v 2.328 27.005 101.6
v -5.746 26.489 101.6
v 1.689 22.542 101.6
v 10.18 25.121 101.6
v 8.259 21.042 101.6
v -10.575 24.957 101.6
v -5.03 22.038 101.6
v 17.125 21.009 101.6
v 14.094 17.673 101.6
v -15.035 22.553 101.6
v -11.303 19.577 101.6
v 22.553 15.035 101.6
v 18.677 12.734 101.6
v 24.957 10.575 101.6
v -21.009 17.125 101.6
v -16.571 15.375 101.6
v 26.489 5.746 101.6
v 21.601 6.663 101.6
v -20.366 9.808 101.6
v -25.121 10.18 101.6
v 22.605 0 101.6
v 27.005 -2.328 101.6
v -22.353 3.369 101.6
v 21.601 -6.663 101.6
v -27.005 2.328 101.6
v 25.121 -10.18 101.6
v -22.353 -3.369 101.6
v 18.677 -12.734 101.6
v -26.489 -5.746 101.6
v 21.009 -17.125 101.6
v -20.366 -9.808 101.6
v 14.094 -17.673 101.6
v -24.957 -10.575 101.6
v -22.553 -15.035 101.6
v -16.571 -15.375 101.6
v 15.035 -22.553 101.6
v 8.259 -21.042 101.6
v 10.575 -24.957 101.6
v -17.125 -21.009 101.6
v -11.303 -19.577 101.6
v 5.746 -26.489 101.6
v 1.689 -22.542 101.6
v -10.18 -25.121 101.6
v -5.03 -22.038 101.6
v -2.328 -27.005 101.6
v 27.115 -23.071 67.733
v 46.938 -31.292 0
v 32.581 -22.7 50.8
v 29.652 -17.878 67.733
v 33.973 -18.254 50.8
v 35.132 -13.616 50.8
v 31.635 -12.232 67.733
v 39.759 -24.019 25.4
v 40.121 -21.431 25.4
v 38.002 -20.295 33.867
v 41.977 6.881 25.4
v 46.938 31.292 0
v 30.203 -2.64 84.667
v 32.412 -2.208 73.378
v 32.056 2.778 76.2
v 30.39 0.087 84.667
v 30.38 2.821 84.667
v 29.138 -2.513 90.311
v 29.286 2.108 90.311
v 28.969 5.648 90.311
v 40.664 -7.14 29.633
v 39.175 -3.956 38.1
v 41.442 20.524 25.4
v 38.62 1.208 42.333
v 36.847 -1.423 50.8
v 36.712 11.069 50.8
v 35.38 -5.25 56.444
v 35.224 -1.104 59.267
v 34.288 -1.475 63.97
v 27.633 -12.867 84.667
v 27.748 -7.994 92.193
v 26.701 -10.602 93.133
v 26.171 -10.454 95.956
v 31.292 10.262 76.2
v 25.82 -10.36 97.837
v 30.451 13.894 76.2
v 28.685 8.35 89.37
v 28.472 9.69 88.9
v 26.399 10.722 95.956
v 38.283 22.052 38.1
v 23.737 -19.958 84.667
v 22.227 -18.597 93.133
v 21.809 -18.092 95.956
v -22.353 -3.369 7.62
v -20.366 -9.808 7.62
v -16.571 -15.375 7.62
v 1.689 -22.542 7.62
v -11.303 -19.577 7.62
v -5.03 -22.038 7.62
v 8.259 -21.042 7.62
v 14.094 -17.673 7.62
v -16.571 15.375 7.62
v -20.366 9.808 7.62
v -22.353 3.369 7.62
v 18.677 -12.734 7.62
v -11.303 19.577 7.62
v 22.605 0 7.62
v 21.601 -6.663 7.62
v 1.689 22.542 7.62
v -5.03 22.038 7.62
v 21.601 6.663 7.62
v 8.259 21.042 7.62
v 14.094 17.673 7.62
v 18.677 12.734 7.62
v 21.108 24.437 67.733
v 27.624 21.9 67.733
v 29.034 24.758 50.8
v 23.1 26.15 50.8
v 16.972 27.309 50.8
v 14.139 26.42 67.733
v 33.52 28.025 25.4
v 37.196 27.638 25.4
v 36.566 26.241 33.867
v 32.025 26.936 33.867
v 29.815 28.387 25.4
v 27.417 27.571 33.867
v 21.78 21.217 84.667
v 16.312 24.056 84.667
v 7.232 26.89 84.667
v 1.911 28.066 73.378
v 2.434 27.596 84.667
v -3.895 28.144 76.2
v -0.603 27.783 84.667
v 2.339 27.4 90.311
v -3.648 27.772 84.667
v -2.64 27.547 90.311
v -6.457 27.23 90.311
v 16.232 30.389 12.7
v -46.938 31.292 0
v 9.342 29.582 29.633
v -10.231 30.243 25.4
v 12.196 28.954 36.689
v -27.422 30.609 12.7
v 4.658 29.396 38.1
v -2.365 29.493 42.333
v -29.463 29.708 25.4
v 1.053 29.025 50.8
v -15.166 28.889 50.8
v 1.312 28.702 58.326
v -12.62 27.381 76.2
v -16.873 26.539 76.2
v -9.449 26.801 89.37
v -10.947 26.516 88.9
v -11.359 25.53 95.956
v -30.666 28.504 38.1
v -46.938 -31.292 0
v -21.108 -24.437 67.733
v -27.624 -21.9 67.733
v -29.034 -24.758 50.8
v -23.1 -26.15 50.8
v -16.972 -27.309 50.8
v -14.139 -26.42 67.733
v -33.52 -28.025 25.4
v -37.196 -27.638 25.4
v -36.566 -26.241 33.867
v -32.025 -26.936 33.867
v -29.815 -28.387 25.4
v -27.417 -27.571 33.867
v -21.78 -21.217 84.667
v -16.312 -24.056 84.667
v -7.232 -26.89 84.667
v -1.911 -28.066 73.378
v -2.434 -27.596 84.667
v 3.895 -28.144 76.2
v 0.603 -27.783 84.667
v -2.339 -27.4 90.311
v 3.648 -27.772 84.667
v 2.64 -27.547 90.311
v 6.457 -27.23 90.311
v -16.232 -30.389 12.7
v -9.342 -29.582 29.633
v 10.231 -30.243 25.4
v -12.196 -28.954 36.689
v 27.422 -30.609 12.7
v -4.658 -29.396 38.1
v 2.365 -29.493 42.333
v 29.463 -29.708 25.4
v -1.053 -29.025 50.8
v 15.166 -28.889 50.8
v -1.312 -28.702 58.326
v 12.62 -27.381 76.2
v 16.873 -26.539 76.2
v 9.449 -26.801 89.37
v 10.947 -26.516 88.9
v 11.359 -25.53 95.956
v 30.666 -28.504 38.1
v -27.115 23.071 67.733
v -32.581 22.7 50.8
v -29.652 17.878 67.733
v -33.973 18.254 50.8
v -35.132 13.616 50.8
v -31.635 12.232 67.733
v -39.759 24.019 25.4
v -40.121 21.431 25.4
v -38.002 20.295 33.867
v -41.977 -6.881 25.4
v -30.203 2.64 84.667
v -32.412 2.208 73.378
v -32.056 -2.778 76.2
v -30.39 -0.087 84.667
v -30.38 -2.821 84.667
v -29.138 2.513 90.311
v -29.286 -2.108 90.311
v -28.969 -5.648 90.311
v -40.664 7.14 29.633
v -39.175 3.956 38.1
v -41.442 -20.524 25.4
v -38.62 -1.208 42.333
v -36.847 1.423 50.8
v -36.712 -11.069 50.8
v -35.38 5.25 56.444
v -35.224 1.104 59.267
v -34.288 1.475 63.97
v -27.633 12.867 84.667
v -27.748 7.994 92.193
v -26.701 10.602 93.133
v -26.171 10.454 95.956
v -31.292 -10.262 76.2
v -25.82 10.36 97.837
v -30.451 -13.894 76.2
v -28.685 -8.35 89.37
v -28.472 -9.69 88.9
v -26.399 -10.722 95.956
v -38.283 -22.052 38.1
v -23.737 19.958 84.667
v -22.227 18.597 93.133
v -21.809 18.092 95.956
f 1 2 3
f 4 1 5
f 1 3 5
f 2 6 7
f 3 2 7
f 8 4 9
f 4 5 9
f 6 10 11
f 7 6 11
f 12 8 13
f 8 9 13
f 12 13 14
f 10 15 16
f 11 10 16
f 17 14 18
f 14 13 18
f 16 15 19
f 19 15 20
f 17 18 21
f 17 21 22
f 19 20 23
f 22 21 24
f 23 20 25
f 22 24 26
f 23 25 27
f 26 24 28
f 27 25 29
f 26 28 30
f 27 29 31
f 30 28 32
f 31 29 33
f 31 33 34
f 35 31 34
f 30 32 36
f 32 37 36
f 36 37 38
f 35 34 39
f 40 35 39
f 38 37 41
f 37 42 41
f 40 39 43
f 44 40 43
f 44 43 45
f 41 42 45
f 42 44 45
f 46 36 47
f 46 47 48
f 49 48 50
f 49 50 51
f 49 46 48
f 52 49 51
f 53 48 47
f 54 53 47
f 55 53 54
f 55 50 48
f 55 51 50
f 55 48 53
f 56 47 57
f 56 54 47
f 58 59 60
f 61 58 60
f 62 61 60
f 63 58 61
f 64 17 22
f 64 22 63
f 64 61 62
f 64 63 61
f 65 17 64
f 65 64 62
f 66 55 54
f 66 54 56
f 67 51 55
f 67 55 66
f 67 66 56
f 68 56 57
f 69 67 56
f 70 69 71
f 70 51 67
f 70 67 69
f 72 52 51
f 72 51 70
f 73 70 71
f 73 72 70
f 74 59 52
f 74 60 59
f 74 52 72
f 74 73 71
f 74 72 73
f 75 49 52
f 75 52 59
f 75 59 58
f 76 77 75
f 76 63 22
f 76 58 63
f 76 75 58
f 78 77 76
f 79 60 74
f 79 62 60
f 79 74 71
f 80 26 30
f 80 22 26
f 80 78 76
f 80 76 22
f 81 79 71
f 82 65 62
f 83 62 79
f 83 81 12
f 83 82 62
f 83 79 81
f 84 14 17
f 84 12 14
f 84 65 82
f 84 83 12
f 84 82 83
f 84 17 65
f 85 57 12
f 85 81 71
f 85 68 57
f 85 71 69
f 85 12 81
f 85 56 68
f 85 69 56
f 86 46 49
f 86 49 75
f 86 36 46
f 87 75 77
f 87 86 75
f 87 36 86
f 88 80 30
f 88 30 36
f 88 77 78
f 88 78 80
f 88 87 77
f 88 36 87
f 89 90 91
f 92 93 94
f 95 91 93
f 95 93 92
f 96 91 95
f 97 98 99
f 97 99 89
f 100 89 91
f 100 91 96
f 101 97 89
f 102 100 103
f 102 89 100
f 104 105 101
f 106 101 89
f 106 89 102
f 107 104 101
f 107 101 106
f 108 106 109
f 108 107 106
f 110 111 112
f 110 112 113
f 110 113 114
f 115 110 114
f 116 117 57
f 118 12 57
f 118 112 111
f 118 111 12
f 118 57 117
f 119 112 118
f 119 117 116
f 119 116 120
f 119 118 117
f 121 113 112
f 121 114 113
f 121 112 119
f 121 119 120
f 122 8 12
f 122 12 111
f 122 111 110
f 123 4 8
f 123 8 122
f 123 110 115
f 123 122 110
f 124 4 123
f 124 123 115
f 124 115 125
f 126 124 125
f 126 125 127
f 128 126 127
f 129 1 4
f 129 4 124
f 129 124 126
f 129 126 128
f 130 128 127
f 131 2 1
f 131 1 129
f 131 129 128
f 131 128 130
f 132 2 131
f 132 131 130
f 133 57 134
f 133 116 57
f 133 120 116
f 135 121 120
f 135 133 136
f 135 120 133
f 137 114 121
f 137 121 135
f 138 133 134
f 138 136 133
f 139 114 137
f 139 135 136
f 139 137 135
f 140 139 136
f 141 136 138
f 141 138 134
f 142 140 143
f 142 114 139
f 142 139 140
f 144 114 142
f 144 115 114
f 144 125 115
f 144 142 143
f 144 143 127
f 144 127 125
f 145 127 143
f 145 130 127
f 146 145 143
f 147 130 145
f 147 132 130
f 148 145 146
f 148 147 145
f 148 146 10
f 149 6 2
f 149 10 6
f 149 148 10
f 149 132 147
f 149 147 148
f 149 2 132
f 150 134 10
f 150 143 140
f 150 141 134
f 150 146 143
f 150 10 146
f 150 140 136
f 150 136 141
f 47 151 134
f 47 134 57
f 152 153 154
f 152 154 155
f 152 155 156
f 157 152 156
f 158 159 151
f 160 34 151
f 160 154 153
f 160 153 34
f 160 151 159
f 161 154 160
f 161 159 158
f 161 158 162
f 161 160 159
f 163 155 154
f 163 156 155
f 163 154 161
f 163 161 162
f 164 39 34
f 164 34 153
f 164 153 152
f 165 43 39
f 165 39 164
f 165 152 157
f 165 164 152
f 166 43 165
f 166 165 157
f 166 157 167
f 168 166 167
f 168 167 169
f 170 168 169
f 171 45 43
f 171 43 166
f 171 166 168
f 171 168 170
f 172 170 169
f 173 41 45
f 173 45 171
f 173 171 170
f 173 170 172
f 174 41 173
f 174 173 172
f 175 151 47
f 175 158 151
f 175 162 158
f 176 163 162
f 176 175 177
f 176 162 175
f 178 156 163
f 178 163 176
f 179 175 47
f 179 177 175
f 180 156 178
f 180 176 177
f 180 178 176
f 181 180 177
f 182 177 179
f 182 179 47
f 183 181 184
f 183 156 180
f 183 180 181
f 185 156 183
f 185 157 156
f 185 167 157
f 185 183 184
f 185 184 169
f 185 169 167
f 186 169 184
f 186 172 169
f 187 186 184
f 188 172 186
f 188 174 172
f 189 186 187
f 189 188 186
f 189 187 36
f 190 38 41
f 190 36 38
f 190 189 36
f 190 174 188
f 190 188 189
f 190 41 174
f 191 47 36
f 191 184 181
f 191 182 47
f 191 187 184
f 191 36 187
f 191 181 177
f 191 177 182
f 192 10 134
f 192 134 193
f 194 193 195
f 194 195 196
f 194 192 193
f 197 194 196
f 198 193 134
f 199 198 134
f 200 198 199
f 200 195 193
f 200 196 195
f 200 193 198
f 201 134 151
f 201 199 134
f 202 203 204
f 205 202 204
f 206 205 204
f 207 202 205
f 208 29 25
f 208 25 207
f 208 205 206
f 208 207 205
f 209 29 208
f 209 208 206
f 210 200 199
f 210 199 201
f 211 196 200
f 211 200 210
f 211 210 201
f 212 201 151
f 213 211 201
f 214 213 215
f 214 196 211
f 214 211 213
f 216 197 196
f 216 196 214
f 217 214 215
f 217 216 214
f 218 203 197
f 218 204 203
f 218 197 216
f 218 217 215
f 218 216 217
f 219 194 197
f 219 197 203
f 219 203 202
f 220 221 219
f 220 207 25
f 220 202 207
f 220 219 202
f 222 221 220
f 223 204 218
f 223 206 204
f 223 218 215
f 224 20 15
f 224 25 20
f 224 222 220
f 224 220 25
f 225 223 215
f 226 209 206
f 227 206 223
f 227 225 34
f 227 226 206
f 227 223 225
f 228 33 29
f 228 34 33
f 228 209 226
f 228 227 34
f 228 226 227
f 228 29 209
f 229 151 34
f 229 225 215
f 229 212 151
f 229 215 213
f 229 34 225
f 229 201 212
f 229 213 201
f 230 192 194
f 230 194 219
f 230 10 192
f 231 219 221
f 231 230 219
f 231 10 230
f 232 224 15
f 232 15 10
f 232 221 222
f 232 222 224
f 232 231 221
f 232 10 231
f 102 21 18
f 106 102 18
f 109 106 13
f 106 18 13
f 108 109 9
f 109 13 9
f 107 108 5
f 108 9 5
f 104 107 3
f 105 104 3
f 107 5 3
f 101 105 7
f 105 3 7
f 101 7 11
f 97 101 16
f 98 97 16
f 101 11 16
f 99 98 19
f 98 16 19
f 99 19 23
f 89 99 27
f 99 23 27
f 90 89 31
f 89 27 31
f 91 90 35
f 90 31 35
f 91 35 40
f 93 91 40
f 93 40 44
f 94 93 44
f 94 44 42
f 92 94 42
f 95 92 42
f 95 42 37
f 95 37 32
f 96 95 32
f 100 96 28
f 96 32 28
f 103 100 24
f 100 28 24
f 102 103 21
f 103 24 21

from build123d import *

# Parameters (mm, degrees)
F5_W     = 93.8750132918
F5_H     = 62.5833421946
F7_R     = 22.6051057699
F8_DEPTH = 93.98


# Not quite as in the source:
# - the arcs of a loft's sections are written as splines that run evenly, so that the points pair up as in the source's solid
# - the program builds the solid bodies; features that only make, move or delete a surface that nothing else refers to are left out


with BuildPart() as f6:
    # F5 (on Top) → F6 section 0
    with BuildSketch(Plane.XY):
        Rectangle(F5_W, F5_H)
    # F4 (on offset) → F6 section 1
    with BuildSketch(Plane.XY.offset(101.6)):
        with BuildLine():
            add(Edge.make_bspline(
                [(22.5525184305, 15.035012287), (21.5684791775, 16.5110711666), (20.439088741, 17.8901765373), (17.9328967072, 20.4016171121), (16.5561570804, 21.5338902158), (13.6081630734, 23.5081403532), (12.0369815881, 24.3500685697), (8.7604753642, 25.7112589441), (7.0552316437, 26.2304874441), (3.5761274997, 26.9263082729), (1.8023531039, 27.1028833962), (-1.7456489391, 27.1065946751), (-3.519788855, 26.9337307389), (-7.0003410682, 26.2451898455), (-8.706667302, 25.7295299139), (-11.9860140158, 24.3751970887), (-13.5589534074, 23.5365576836), (-15.035012287, 22.5525184305)],
                knots=[0, 0, 0, 0, 0.125, 0.125, 0.25, 0.25, 0.375, 0.375, 0.5, 0.5, 0.625, 0.625, 0.75, 0.75, 0.875, 0.875, 1, 1, 1, 1], degree=3))
            add(Edge.make_bspline(
                [(-15.035012287, 22.5525184305), (-16.5110711666, 21.5684791775), (-17.8901765373, 20.439088741), (-20.4016171121, 17.9328967072), (-21.5338902158, 16.5561570804), (-23.5081403532, 13.6081630734), (-24.3500685697, 12.0369815881), (-25.7112589441, 8.7604753642), (-26.2304874441, 7.0552316437), (-26.9263082729, 3.5761274997), (-27.1028833962, 1.8023531039), (-27.1065946751, -1.7456489391), (-26.9337307389, -3.519788855), (-26.2451898455, -7.0003410682), (-25.7295299139, -8.706667302), (-24.3751970887, -11.9860140158), (-23.5365576836, -13.5589534074), (-22.5525184305, -15.035012287)],
                knots=[0, 0, 0, 0, 0.125, 0.125, 0.25, 0.25, 0.375, 0.375, 0.5, 0.5, 0.625, 0.625, 0.75, 0.75, 0.875, 0.875, 1, 1, 1, 1], degree=3))
            add(Edge.make_bspline(
                [(-22.5525184305, -15.035012287), (-21.5684791775, -16.5110711666), (-20.439088741, -17.8901765373), (-17.9328967072, -20.4016171121), (-16.5561570804, -21.5338902158), (-13.6081630734, -23.5081403532), (-12.0369815881, -24.3500685697), (-8.7604753642, -25.7112589441), (-7.0552316437, -26.2304874441), (-3.5761274997, -26.9263082729), (-1.8023531039, -27.1028833962), (1.7456489391, -27.1065946751), (3.519788855, -26.9337307389), (7.0003410682, -26.2451898455), (8.706667302, -25.7295299139), (11.9860140158, -24.3751970887), (13.5589534074, -23.5365576836), (15.035012287, -22.5525184305)],
                knots=[0, 0, 0, 0, 0.125, 0.125, 0.25, 0.25, 0.375, 0.375, 0.5, 0.5, 0.625, 0.625, 0.75, 0.75, 0.875, 0.875, 1, 1, 1, 1], degree=3))
            add(Edge.make_bspline(
                [(15.035012287, -22.5525184305), (16.5110711666, -21.5684791775), (17.8901765373, -20.439088741), (20.4016171121, -17.9328967072), (21.5338902158, -16.5561570804), (23.5081403532, -13.6081630734), (24.3500685697, -12.0369815881), (25.7112589441, -8.7604753642), (26.2304874441, -7.0552316437), (26.9263082729, -3.5761274997), (27.1028833962, -1.8023531039), (27.1065946751, 1.7456489391), (26.9337307389, 3.519788855), (26.2451898455, 7.0003410682), (25.7295299139, 8.706667302), (24.3751970887, 11.9860140158), (23.5365576836, 13.5589534074), (22.5525184305, 15.035012287)],
                knots=[0, 0, 0, 0, 0.125, 0.125, 0.25, 0.25, 0.375, 0.375, 0.5, 0.5, 0.625, 0.625, 0.75, 0.75, 0.875, 0.875, 1, 1, 1, 1], degree=3))
        make_face()
    loft(ruled=True)

    # F7 (on offset) → F8 (cut)
    with BuildSketch(Plane.XY.offset(101.6)):
        Circle(F7_R)
    extrude(amount=-F8_DEPTH, mode=Mode.SUBTRACT)


solid = f6.part
